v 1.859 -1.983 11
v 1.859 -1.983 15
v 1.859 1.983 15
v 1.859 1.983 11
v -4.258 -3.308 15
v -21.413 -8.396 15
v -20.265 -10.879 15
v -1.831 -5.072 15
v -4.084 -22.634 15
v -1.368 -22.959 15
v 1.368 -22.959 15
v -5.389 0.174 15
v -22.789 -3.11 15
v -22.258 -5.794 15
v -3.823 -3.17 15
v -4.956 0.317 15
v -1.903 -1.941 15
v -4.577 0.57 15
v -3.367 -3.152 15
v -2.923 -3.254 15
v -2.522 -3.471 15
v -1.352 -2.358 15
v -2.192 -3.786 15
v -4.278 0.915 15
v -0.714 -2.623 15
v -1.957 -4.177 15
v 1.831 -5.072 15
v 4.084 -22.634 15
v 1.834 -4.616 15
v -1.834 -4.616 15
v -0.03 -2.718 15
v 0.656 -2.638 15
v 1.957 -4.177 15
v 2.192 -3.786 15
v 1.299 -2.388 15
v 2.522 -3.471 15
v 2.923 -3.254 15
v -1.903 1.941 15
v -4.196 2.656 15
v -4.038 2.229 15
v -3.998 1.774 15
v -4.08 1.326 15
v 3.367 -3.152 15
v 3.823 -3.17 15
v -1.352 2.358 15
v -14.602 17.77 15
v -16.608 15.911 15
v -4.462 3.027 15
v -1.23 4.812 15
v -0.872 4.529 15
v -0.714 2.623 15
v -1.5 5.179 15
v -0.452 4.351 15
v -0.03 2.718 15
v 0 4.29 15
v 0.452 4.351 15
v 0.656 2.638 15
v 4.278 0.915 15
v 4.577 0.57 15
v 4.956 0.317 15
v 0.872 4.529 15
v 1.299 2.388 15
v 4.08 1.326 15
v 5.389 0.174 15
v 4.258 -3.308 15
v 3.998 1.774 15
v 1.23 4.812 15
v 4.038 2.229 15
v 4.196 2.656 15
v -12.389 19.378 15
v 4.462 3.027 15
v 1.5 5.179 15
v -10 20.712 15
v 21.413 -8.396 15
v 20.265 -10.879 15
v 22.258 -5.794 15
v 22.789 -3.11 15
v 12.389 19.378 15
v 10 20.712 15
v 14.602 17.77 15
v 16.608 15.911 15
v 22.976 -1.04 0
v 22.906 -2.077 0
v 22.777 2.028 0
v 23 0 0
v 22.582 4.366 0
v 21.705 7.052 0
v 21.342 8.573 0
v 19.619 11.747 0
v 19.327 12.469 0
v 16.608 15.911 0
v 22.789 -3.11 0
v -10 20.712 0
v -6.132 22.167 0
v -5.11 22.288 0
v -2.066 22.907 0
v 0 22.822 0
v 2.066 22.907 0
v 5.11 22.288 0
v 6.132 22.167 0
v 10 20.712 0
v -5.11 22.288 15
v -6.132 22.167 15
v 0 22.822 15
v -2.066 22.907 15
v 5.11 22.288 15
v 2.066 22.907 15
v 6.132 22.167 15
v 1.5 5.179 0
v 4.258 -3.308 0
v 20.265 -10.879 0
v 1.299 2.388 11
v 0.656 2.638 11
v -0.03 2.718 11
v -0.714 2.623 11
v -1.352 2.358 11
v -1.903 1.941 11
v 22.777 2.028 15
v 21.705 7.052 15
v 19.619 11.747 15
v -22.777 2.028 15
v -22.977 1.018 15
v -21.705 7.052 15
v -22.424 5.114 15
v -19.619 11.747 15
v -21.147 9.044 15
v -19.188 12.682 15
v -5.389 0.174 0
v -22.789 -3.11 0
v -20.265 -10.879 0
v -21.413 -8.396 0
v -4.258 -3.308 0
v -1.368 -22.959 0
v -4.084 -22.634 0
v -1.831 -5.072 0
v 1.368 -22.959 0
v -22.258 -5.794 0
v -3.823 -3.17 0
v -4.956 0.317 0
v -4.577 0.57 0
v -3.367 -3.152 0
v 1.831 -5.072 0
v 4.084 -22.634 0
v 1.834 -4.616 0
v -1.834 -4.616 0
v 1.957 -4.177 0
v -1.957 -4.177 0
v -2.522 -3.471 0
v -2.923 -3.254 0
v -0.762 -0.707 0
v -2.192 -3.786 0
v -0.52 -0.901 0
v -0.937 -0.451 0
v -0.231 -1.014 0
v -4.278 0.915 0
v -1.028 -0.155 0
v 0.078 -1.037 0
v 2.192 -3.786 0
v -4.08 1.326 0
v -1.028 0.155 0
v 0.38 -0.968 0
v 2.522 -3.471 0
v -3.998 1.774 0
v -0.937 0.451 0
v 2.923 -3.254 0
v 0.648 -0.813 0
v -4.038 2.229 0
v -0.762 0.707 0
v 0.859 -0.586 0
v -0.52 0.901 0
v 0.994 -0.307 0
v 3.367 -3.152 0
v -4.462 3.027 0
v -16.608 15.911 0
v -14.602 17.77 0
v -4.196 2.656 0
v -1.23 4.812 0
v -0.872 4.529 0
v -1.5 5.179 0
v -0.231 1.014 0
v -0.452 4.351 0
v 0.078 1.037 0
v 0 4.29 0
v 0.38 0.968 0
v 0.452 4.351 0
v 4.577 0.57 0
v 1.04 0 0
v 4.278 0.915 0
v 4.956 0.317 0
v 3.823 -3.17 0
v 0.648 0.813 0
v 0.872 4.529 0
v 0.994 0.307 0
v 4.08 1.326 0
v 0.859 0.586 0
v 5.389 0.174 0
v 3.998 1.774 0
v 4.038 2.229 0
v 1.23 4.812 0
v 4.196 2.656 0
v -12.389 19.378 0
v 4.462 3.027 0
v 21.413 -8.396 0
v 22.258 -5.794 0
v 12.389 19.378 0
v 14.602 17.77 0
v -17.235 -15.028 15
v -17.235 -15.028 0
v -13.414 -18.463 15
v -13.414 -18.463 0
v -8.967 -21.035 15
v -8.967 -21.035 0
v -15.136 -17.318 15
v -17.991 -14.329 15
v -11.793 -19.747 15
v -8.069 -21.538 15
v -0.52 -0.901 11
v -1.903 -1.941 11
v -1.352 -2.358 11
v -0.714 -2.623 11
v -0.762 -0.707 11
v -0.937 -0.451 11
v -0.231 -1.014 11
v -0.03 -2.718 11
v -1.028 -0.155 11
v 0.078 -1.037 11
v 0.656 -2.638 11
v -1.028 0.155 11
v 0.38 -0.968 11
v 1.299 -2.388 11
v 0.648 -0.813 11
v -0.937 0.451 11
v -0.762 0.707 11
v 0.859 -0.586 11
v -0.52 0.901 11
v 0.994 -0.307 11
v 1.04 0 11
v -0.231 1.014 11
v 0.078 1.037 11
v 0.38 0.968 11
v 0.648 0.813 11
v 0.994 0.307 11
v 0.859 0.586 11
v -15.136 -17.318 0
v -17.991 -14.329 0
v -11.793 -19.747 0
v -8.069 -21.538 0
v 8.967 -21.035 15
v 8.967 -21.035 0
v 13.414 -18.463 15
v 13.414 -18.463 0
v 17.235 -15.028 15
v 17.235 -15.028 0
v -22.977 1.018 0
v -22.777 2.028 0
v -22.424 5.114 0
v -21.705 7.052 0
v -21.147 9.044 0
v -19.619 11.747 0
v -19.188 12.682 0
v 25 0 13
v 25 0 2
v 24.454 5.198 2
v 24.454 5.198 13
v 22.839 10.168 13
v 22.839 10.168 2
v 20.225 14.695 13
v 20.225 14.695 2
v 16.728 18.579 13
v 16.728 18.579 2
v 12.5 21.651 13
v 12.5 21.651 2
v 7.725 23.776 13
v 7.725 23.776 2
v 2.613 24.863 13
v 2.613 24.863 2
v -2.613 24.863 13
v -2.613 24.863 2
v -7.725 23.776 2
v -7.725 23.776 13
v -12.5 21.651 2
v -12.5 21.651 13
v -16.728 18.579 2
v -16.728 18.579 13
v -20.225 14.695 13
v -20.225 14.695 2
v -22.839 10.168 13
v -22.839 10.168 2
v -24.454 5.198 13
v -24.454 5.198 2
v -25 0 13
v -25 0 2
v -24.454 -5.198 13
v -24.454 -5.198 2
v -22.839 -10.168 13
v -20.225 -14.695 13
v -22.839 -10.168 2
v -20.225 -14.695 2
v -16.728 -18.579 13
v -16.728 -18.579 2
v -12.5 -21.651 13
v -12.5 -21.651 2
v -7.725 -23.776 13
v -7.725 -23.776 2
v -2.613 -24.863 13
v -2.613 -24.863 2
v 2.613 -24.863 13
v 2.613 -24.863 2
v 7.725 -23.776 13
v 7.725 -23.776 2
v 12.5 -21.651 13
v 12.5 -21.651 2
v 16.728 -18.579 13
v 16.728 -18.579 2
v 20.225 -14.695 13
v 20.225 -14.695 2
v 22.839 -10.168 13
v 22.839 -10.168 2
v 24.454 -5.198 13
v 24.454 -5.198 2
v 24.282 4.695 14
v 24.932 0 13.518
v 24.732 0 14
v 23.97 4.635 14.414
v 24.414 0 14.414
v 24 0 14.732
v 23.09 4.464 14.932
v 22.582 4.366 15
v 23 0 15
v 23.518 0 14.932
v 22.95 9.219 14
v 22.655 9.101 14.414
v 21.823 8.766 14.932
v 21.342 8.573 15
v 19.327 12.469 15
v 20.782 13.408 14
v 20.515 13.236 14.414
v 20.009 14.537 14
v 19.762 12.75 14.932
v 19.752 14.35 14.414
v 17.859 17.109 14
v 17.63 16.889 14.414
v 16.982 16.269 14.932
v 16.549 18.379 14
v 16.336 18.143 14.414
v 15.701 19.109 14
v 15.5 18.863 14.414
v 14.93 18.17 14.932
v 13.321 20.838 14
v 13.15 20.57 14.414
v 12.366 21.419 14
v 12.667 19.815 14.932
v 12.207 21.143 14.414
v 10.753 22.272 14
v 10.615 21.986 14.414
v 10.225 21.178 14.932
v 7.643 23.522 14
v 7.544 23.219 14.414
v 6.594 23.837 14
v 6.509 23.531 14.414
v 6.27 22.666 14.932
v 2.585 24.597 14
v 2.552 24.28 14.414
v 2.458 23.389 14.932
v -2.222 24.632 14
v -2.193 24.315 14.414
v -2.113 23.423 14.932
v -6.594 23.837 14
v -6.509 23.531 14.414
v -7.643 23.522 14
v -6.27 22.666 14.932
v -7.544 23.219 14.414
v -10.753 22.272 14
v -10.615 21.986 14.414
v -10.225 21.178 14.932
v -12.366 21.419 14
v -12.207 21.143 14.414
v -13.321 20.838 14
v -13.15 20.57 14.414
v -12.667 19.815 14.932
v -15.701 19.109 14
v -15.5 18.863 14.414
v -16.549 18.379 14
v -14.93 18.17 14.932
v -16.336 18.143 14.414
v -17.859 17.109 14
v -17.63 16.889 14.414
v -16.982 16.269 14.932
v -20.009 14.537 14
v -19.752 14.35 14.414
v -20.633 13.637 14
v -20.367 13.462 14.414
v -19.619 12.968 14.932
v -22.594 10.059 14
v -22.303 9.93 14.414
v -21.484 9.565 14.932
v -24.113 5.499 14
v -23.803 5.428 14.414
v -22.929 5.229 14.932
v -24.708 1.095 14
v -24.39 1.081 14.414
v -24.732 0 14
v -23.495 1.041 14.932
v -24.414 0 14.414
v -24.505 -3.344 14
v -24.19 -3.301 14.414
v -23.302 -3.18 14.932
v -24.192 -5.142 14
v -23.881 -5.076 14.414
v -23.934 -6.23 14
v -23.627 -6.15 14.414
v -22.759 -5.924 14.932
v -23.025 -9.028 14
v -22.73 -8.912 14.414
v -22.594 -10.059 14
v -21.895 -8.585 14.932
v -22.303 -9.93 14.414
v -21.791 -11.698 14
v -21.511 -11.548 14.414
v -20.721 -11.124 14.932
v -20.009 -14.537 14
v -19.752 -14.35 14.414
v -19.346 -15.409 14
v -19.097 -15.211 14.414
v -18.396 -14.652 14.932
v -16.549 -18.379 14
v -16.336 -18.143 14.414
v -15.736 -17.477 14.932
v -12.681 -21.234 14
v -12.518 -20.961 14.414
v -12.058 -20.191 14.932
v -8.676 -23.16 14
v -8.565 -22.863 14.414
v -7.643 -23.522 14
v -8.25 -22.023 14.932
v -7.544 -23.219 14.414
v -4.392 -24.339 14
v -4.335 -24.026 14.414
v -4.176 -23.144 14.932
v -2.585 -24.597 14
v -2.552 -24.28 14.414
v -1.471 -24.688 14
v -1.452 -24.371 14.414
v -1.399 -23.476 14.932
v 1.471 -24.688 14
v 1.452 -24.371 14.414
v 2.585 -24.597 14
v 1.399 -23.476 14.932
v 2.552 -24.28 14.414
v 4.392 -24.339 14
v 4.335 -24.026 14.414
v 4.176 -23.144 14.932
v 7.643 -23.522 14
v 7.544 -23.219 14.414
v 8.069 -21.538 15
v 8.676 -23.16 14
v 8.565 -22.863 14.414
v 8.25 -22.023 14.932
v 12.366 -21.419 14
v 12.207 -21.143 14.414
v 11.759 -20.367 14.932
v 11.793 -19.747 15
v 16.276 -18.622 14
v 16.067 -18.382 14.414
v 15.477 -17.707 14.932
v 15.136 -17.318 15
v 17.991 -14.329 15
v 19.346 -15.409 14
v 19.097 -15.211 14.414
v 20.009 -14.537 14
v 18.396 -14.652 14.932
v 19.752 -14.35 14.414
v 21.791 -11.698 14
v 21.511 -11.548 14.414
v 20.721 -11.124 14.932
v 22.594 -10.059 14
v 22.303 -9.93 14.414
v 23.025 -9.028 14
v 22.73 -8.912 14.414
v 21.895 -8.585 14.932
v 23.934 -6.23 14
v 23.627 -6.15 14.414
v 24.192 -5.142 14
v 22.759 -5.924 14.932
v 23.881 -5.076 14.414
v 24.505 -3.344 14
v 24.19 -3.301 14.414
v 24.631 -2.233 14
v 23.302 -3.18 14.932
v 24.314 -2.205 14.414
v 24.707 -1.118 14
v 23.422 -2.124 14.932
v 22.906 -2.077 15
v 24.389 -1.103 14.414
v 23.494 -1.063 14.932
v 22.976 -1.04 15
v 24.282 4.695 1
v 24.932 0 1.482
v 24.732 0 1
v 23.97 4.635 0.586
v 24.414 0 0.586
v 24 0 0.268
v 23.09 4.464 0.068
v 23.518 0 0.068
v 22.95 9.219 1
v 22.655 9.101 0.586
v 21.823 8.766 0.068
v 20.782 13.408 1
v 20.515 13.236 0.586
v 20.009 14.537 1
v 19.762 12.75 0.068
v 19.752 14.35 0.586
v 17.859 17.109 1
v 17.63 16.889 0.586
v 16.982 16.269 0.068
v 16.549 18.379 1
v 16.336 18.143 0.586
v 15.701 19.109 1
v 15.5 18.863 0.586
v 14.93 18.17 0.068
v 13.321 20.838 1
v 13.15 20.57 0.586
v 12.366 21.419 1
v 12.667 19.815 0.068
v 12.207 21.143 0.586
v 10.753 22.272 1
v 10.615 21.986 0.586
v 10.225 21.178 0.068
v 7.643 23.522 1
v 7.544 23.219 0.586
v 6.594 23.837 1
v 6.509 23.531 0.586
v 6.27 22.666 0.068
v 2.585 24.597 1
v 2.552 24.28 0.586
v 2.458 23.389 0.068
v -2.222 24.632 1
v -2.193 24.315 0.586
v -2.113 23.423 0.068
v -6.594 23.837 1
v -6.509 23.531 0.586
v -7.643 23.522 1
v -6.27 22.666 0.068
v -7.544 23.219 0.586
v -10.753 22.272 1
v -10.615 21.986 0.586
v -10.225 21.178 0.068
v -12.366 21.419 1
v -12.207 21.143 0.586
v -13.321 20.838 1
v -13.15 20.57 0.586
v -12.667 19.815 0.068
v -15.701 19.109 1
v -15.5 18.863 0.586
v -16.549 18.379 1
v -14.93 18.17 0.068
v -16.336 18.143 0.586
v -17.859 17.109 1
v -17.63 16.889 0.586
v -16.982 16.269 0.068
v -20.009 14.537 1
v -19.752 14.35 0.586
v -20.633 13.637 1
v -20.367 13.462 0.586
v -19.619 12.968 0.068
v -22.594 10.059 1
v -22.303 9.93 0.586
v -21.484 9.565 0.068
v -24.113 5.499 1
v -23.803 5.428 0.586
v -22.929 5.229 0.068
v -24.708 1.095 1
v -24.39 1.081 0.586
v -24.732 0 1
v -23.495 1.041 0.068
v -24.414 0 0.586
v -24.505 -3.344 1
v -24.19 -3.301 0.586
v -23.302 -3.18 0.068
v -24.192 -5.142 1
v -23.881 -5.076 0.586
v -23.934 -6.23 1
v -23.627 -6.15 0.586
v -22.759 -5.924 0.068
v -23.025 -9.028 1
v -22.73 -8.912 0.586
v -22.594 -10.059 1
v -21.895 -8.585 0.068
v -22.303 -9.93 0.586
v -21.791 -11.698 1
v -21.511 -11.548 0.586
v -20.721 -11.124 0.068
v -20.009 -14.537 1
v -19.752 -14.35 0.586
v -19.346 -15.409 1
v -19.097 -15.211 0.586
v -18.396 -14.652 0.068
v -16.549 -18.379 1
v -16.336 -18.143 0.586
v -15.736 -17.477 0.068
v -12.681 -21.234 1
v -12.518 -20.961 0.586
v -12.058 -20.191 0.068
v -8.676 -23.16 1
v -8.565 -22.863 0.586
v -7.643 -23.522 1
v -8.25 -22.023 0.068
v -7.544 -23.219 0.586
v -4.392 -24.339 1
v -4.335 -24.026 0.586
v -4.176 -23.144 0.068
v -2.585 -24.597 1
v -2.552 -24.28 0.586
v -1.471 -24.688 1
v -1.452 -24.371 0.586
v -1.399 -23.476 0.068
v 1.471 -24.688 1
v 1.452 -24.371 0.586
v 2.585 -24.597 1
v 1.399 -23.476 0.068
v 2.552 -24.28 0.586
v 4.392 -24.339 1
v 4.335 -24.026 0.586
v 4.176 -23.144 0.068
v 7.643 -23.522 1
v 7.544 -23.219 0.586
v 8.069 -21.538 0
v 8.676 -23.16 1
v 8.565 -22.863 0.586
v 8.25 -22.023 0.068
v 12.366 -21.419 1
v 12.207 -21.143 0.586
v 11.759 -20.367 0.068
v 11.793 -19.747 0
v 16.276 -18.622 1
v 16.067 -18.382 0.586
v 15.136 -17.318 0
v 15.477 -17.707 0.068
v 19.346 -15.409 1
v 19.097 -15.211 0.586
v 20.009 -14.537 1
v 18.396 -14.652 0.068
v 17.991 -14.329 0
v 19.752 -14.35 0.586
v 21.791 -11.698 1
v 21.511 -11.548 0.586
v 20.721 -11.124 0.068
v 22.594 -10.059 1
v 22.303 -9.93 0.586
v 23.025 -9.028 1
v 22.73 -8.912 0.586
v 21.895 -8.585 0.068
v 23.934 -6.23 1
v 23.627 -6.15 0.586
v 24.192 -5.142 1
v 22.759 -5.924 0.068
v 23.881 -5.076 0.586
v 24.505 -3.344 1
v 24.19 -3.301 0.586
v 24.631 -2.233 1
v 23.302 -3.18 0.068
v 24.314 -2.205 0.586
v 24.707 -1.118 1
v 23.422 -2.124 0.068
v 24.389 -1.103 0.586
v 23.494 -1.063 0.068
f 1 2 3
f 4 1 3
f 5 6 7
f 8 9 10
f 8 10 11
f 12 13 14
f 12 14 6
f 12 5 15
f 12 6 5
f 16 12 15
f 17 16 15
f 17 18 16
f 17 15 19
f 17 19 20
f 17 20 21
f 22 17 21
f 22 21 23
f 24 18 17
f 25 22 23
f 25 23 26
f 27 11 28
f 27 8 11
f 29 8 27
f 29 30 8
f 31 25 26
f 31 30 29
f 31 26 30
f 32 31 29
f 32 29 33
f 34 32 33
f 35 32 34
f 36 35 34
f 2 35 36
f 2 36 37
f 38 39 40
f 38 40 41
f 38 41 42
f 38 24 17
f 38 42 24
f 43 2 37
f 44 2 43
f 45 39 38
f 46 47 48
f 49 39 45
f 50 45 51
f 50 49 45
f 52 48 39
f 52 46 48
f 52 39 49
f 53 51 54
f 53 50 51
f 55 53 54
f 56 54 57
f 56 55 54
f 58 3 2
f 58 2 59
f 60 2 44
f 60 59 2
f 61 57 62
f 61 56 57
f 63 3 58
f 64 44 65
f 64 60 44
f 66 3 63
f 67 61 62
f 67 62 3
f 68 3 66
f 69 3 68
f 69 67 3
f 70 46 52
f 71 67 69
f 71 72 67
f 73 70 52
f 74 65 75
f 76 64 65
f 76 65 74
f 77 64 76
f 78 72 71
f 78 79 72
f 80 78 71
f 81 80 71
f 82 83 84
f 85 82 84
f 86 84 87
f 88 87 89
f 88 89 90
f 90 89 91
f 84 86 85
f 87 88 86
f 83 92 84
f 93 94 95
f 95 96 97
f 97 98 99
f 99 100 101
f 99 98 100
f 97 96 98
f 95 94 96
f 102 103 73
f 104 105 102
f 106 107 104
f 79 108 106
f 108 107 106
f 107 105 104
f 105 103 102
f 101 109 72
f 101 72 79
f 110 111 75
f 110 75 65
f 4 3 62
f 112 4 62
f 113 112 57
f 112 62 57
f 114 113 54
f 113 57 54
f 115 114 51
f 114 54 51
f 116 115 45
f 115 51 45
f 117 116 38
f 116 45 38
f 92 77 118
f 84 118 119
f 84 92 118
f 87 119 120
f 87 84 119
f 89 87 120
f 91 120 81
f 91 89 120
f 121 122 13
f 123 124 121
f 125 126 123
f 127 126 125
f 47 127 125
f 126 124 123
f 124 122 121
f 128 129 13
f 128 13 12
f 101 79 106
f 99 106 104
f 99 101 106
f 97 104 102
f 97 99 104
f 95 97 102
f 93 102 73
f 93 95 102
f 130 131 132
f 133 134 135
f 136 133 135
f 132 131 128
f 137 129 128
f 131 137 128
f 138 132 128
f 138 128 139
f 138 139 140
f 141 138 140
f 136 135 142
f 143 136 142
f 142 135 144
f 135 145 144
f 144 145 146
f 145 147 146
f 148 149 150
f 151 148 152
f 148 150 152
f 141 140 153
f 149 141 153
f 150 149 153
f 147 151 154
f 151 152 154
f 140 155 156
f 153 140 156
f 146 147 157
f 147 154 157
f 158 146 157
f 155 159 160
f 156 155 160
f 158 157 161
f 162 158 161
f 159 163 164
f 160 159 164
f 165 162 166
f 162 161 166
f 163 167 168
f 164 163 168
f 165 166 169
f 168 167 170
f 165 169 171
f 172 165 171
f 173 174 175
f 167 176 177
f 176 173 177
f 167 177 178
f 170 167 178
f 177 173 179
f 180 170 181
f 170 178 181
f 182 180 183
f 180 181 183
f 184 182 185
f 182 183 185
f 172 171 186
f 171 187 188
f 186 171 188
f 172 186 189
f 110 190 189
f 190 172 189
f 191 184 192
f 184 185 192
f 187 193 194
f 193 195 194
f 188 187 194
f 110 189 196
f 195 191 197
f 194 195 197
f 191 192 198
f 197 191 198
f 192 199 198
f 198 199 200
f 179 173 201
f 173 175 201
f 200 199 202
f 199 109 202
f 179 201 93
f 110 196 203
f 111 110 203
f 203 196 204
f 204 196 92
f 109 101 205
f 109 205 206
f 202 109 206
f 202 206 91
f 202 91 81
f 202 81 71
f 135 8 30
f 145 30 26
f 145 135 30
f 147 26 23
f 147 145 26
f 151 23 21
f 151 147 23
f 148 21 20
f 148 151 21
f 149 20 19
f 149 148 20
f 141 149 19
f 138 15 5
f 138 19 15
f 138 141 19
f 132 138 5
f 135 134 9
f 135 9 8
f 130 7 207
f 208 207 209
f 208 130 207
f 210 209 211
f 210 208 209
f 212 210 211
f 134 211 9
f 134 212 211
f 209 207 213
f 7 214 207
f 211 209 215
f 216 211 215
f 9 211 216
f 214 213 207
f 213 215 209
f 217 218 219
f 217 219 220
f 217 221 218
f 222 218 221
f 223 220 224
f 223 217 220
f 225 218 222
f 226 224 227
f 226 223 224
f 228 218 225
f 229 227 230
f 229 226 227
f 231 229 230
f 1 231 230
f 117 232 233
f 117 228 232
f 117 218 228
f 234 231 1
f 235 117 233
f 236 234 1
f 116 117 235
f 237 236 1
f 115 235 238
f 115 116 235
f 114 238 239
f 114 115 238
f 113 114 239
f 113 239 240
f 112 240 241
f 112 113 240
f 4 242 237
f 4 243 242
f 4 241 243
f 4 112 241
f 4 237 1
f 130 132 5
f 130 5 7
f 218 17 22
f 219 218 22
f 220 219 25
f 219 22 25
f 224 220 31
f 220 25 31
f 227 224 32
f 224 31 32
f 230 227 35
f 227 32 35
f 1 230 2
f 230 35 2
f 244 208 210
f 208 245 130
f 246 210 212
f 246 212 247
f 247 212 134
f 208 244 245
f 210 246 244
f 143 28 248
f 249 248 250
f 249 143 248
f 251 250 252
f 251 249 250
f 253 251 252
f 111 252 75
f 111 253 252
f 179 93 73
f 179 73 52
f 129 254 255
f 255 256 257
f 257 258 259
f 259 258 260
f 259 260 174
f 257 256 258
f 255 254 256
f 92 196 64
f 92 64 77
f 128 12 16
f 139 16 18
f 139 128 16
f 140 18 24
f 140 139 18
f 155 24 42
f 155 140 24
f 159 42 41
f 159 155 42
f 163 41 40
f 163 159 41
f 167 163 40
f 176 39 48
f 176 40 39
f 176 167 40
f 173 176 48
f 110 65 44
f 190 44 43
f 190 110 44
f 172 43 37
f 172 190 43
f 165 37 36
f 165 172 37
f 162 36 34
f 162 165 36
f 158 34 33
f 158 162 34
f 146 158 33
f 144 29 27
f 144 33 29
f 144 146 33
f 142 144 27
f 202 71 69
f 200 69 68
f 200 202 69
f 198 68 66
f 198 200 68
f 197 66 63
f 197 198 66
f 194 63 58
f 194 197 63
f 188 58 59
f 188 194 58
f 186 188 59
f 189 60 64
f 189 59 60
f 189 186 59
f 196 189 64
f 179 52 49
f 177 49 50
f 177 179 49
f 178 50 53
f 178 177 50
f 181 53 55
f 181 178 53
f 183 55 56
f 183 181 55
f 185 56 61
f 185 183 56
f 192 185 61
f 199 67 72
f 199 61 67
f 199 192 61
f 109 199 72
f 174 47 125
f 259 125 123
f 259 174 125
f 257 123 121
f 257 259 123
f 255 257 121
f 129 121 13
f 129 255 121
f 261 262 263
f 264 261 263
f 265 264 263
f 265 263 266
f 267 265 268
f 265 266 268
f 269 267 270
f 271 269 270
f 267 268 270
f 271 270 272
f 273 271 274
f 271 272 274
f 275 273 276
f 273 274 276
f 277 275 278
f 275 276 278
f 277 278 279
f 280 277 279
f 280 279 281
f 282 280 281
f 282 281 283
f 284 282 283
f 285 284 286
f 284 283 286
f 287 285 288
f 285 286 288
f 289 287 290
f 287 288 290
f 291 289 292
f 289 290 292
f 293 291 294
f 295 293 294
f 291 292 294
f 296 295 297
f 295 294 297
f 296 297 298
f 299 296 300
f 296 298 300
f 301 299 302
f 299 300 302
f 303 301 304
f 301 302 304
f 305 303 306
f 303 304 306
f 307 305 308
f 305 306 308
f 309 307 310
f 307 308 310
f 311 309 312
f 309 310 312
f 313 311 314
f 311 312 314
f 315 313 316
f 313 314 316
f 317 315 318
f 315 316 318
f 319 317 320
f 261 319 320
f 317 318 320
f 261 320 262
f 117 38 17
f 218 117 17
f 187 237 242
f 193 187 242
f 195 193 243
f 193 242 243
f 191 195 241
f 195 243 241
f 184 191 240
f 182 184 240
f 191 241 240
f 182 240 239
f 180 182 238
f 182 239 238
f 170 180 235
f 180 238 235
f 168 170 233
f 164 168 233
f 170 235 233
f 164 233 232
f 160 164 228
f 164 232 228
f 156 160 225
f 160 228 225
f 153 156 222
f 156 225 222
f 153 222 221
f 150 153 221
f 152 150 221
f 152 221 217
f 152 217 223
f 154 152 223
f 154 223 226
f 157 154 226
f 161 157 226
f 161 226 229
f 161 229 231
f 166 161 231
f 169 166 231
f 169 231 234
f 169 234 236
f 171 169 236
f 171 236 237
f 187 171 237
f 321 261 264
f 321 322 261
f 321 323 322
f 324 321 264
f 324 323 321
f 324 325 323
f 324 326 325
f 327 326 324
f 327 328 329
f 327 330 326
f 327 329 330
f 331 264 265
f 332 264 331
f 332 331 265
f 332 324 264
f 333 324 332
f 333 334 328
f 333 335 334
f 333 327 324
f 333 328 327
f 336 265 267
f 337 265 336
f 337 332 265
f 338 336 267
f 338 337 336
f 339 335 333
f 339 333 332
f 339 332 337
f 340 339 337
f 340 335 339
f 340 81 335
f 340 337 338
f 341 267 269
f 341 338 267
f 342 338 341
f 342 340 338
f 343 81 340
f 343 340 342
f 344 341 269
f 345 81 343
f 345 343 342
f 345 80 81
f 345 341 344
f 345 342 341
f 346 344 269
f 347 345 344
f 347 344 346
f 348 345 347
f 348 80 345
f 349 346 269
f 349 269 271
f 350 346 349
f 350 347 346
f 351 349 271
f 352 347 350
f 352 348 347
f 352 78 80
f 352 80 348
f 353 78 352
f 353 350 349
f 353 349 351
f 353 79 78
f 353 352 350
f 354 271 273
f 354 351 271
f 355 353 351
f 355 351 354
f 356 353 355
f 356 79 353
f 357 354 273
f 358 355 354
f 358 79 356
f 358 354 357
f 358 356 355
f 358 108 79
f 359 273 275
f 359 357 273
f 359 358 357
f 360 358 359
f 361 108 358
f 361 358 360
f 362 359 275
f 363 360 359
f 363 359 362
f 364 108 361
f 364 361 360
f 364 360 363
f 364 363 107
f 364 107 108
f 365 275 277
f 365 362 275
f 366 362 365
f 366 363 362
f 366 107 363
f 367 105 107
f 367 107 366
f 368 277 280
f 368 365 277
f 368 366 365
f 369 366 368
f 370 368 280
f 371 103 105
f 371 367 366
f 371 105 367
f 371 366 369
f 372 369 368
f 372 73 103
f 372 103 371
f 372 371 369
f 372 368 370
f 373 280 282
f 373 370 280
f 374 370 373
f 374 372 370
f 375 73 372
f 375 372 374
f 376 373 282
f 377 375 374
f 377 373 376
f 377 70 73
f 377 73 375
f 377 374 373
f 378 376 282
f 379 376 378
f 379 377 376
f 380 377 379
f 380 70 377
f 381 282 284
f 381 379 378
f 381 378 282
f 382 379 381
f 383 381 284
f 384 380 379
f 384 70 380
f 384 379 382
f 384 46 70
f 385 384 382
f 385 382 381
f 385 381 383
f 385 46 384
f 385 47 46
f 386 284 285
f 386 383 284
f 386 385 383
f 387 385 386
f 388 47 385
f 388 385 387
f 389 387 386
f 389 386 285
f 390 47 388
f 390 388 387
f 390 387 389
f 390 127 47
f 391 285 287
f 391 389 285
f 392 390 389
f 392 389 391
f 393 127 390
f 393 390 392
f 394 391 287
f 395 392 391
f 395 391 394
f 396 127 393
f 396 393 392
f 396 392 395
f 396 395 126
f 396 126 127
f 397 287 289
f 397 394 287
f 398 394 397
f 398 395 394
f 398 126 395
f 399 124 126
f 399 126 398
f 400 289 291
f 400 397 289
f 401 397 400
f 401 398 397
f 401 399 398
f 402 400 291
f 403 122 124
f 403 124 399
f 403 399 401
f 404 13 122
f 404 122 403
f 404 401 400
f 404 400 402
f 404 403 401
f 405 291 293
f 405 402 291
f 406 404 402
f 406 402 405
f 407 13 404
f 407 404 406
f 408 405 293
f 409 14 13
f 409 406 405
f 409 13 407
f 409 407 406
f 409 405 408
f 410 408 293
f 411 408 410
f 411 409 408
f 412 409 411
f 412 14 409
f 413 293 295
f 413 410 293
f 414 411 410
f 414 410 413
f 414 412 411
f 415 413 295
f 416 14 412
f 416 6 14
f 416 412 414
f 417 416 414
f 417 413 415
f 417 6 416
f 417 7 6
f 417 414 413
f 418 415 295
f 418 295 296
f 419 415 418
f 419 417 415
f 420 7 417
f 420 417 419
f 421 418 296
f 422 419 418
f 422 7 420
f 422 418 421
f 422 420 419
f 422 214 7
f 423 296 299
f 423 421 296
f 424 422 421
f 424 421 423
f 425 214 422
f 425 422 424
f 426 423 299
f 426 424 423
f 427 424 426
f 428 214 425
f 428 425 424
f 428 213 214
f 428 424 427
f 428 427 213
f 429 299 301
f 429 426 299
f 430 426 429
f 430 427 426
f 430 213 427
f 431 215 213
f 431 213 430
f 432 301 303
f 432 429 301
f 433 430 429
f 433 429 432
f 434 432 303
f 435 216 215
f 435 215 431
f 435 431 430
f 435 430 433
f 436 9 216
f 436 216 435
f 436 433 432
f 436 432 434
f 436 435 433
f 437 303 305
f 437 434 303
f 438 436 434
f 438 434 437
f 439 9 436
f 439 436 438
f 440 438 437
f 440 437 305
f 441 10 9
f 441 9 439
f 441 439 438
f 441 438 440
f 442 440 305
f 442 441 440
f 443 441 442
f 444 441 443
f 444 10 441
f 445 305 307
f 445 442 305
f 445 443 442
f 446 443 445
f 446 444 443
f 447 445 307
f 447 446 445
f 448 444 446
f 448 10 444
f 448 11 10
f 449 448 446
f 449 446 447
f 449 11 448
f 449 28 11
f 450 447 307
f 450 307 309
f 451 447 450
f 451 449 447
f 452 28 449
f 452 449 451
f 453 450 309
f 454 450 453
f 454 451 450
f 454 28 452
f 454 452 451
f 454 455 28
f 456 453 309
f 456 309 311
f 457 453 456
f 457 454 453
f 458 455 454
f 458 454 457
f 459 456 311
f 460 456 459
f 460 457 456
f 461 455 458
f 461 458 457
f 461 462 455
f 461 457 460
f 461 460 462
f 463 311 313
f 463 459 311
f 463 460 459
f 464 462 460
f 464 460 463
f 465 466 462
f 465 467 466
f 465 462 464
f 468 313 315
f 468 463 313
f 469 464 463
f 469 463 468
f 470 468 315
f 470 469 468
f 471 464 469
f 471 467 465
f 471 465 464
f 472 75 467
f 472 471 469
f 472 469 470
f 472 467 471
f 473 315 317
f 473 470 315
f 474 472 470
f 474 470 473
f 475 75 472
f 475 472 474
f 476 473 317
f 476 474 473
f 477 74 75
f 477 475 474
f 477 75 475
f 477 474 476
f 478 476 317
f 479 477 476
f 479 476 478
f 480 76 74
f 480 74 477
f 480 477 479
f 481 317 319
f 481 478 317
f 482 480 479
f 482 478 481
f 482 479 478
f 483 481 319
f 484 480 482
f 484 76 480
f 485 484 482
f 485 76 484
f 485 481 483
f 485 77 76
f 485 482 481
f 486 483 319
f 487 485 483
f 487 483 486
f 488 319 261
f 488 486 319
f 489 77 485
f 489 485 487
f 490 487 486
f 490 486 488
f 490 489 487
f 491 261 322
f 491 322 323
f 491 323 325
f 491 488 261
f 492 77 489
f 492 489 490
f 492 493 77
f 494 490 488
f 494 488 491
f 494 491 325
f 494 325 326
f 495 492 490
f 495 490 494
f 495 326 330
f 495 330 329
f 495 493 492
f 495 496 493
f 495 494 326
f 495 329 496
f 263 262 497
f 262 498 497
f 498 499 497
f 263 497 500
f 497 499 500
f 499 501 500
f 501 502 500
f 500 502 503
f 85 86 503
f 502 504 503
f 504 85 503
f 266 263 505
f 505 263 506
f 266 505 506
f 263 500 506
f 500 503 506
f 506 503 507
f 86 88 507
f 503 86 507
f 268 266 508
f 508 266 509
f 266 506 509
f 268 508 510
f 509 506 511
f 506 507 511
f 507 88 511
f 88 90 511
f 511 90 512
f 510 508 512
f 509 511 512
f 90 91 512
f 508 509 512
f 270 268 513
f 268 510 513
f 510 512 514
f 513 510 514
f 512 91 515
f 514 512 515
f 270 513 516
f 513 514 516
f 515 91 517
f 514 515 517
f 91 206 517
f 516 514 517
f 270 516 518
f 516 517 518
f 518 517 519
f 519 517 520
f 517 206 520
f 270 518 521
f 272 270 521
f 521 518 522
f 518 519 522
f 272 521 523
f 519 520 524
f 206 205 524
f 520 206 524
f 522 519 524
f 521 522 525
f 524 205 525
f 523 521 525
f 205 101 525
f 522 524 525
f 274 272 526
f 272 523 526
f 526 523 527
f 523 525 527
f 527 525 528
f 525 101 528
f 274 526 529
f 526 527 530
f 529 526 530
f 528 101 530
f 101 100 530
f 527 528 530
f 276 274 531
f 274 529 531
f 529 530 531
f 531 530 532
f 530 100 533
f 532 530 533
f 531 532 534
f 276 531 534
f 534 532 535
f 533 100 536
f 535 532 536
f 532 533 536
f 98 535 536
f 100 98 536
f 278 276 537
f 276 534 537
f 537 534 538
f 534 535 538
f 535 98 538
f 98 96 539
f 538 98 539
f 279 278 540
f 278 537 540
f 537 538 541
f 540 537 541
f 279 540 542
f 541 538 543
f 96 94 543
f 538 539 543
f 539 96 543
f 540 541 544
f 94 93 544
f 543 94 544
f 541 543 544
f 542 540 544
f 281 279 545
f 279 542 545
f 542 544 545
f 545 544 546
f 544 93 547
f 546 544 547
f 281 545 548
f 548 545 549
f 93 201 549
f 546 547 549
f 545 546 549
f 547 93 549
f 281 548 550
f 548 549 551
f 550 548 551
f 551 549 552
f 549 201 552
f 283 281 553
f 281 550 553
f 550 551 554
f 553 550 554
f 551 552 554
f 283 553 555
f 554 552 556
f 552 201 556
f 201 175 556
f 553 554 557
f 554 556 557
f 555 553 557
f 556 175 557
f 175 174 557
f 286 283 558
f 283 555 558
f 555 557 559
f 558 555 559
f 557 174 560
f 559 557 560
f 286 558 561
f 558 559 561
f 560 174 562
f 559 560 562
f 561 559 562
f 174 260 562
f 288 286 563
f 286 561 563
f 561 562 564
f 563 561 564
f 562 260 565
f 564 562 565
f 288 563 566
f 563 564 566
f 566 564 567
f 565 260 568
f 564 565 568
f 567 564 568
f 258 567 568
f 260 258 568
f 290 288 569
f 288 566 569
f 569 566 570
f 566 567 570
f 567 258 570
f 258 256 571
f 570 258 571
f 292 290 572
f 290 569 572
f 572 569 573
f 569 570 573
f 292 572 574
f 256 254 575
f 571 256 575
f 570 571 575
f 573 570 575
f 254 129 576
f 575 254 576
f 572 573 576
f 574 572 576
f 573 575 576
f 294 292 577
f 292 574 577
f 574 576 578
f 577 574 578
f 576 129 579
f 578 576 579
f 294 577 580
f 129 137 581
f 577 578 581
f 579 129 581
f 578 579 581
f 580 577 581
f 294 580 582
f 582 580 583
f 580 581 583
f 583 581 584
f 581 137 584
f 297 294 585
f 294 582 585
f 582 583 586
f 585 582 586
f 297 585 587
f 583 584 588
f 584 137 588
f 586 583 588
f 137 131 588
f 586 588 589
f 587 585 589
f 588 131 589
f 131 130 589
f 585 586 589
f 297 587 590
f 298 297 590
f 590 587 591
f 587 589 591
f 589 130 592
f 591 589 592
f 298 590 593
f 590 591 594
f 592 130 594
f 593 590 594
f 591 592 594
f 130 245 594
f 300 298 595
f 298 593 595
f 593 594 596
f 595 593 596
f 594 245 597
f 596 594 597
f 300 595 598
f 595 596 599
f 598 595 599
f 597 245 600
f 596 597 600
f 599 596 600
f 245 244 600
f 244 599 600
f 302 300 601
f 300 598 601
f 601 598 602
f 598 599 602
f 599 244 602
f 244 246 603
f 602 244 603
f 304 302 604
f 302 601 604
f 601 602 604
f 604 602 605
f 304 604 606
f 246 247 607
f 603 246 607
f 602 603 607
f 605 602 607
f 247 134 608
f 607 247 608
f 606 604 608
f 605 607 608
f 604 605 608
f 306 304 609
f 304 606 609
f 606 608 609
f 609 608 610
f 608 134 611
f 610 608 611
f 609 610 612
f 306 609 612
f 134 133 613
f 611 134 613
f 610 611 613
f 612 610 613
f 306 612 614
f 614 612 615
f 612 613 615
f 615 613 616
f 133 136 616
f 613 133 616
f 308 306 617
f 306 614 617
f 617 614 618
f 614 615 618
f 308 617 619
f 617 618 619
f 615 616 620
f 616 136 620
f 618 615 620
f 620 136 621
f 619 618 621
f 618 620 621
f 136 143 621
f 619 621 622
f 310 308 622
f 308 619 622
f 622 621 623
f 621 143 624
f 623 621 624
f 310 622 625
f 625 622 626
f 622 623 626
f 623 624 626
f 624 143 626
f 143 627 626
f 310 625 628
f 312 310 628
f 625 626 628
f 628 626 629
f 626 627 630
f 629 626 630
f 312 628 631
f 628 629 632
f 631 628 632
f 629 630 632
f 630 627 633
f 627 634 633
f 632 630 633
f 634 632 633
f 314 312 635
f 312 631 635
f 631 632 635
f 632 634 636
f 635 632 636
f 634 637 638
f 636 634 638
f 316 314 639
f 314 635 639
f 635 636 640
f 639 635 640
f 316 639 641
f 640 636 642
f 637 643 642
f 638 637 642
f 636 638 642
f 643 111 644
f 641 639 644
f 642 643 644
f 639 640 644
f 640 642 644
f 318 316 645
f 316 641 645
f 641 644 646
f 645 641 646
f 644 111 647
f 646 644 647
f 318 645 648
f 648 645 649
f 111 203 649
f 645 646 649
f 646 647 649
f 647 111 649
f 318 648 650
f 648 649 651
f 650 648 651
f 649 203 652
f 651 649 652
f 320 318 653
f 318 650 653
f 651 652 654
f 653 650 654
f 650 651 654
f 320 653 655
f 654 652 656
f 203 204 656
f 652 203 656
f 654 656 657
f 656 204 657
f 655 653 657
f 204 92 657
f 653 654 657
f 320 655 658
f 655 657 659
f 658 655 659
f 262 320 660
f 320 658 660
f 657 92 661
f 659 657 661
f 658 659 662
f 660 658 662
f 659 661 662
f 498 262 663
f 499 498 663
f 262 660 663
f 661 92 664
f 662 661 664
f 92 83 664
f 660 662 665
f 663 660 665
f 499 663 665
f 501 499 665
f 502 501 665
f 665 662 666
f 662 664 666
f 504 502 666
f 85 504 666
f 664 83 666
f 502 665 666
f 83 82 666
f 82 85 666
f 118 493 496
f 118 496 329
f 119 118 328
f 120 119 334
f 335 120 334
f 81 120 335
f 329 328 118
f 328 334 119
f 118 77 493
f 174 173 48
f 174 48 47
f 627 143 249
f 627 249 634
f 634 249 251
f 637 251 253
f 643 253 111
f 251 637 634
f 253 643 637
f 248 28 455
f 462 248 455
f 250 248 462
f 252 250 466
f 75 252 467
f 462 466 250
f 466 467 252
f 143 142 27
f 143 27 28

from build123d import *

# Parameters (mm, degrees)
SKETCH1_R           = 25
BOSS_EXTRUDE1_DEPTH = 15
FILLET1_R           = 2
CUT_EXTRUDE1_DEPTH  = 4
SKETCH7_R           = 1.04
CUT_EXTRUDE2_DEPTH  = 39.405728804
CUT_EXTRUDE3_REACH  = 40.406
CIRPATTERN1_COUNT   = 5


with BuildPart() as part:
    # Sketch1 → Boss-Extrude1 (new body)
    with BuildSketch(Plane.XY):
        Circle(SKETCH1_R)
    extrude(amount=BOSS_EXTRUDE1_DEPTH)

    # Fillet1
    fillet1_edges = [part.edges().sort_by_distance(p)[0] for p in [
        (-25, 0, 0),
        (-25, 0, 15),
    ]]
    fillet(fillet1_edges, radius=FILLET1_R)

    # Sketch4 → Cut-Extrude1 (cut)
    with BuildSketch(Plane.XY.offset(15)):
        with BuildLine():
            Line((-1.902969848, 1.941233493), (-1.902969848, -1.941233493))
            ThreePointArc((-1.902969848, -1.941233493), (-0.030378036, -2.71822716), (1.859110772, -1.983277302))
            Line((1.859110772, -1.983277302), (1.859110772, 1.983277302))
            ThreePointArc((1.859110772, 1.983277302), (-0.030378036, 2.71822716), (-1.902969848, 1.941233493))
        make_face()
    extrude(amount=-CUT_EXTRUDE1_DEPTH, mode=Mode.SUBTRACT)

    # Sketch7 → Cut-Extrude2 (cut, through all)
    with BuildSketch(Plane.XY.offset(15)):
        Circle(SKETCH7_R)
    extrude(amount=-CUT_EXTRUDE2_DEPTH, mode=Mode.SUBTRACT)

    # Sketch8 → Cut-Extrude3 (cut, up to next)
    with BuildSketch(Plane(origin=(0, 0, 0), x_dir=(-1, 0, 0), z_dir=(0, 0, -1)), mode=Mode.PRIVATE) as cut_extrude3_sk1:
        with BuildLine():
            Line((-1.5, 5.179174375), (-10, 20.712315177))
            ThreePointArc((-10, 20.712315177), (0, 22.821540356), (10, 20.712315177))
            Line((10, 20.712315177), (1.5, 5.179174375))
            ThreePointArc((1.5, 5.179174375), (0, 4.290100966), (-1.5, 5.179174375))
        make_face()
    cut_extrude3_tool1 = extrude(cut_extrude3_sk1.sketch, amount=-CUT_EXTRUDE3_REACH, mode=Mode.PRIVATE) & part.part
    cut_extrude3 = cut_extrude3_tool1.solids().sort_by_distance((0, 15.677953, 0))[0]
    add(cut_extrude3, mode=Mode.SUBTRACT)

    # CirPattern1: Cut-Extrude3 ×5 about axis
    cirpattern1_axis = Axis((0, 0, 0), (0, 0, 1))
    for i in range(1, CIRPATTERN1_COUNT):
        add(cut_extrude3.rotate(cirpattern1_axis, i * 360 / CIRPATTERN1_COUNT), mode=Mode.SUBTRACT)


solid = part.part
